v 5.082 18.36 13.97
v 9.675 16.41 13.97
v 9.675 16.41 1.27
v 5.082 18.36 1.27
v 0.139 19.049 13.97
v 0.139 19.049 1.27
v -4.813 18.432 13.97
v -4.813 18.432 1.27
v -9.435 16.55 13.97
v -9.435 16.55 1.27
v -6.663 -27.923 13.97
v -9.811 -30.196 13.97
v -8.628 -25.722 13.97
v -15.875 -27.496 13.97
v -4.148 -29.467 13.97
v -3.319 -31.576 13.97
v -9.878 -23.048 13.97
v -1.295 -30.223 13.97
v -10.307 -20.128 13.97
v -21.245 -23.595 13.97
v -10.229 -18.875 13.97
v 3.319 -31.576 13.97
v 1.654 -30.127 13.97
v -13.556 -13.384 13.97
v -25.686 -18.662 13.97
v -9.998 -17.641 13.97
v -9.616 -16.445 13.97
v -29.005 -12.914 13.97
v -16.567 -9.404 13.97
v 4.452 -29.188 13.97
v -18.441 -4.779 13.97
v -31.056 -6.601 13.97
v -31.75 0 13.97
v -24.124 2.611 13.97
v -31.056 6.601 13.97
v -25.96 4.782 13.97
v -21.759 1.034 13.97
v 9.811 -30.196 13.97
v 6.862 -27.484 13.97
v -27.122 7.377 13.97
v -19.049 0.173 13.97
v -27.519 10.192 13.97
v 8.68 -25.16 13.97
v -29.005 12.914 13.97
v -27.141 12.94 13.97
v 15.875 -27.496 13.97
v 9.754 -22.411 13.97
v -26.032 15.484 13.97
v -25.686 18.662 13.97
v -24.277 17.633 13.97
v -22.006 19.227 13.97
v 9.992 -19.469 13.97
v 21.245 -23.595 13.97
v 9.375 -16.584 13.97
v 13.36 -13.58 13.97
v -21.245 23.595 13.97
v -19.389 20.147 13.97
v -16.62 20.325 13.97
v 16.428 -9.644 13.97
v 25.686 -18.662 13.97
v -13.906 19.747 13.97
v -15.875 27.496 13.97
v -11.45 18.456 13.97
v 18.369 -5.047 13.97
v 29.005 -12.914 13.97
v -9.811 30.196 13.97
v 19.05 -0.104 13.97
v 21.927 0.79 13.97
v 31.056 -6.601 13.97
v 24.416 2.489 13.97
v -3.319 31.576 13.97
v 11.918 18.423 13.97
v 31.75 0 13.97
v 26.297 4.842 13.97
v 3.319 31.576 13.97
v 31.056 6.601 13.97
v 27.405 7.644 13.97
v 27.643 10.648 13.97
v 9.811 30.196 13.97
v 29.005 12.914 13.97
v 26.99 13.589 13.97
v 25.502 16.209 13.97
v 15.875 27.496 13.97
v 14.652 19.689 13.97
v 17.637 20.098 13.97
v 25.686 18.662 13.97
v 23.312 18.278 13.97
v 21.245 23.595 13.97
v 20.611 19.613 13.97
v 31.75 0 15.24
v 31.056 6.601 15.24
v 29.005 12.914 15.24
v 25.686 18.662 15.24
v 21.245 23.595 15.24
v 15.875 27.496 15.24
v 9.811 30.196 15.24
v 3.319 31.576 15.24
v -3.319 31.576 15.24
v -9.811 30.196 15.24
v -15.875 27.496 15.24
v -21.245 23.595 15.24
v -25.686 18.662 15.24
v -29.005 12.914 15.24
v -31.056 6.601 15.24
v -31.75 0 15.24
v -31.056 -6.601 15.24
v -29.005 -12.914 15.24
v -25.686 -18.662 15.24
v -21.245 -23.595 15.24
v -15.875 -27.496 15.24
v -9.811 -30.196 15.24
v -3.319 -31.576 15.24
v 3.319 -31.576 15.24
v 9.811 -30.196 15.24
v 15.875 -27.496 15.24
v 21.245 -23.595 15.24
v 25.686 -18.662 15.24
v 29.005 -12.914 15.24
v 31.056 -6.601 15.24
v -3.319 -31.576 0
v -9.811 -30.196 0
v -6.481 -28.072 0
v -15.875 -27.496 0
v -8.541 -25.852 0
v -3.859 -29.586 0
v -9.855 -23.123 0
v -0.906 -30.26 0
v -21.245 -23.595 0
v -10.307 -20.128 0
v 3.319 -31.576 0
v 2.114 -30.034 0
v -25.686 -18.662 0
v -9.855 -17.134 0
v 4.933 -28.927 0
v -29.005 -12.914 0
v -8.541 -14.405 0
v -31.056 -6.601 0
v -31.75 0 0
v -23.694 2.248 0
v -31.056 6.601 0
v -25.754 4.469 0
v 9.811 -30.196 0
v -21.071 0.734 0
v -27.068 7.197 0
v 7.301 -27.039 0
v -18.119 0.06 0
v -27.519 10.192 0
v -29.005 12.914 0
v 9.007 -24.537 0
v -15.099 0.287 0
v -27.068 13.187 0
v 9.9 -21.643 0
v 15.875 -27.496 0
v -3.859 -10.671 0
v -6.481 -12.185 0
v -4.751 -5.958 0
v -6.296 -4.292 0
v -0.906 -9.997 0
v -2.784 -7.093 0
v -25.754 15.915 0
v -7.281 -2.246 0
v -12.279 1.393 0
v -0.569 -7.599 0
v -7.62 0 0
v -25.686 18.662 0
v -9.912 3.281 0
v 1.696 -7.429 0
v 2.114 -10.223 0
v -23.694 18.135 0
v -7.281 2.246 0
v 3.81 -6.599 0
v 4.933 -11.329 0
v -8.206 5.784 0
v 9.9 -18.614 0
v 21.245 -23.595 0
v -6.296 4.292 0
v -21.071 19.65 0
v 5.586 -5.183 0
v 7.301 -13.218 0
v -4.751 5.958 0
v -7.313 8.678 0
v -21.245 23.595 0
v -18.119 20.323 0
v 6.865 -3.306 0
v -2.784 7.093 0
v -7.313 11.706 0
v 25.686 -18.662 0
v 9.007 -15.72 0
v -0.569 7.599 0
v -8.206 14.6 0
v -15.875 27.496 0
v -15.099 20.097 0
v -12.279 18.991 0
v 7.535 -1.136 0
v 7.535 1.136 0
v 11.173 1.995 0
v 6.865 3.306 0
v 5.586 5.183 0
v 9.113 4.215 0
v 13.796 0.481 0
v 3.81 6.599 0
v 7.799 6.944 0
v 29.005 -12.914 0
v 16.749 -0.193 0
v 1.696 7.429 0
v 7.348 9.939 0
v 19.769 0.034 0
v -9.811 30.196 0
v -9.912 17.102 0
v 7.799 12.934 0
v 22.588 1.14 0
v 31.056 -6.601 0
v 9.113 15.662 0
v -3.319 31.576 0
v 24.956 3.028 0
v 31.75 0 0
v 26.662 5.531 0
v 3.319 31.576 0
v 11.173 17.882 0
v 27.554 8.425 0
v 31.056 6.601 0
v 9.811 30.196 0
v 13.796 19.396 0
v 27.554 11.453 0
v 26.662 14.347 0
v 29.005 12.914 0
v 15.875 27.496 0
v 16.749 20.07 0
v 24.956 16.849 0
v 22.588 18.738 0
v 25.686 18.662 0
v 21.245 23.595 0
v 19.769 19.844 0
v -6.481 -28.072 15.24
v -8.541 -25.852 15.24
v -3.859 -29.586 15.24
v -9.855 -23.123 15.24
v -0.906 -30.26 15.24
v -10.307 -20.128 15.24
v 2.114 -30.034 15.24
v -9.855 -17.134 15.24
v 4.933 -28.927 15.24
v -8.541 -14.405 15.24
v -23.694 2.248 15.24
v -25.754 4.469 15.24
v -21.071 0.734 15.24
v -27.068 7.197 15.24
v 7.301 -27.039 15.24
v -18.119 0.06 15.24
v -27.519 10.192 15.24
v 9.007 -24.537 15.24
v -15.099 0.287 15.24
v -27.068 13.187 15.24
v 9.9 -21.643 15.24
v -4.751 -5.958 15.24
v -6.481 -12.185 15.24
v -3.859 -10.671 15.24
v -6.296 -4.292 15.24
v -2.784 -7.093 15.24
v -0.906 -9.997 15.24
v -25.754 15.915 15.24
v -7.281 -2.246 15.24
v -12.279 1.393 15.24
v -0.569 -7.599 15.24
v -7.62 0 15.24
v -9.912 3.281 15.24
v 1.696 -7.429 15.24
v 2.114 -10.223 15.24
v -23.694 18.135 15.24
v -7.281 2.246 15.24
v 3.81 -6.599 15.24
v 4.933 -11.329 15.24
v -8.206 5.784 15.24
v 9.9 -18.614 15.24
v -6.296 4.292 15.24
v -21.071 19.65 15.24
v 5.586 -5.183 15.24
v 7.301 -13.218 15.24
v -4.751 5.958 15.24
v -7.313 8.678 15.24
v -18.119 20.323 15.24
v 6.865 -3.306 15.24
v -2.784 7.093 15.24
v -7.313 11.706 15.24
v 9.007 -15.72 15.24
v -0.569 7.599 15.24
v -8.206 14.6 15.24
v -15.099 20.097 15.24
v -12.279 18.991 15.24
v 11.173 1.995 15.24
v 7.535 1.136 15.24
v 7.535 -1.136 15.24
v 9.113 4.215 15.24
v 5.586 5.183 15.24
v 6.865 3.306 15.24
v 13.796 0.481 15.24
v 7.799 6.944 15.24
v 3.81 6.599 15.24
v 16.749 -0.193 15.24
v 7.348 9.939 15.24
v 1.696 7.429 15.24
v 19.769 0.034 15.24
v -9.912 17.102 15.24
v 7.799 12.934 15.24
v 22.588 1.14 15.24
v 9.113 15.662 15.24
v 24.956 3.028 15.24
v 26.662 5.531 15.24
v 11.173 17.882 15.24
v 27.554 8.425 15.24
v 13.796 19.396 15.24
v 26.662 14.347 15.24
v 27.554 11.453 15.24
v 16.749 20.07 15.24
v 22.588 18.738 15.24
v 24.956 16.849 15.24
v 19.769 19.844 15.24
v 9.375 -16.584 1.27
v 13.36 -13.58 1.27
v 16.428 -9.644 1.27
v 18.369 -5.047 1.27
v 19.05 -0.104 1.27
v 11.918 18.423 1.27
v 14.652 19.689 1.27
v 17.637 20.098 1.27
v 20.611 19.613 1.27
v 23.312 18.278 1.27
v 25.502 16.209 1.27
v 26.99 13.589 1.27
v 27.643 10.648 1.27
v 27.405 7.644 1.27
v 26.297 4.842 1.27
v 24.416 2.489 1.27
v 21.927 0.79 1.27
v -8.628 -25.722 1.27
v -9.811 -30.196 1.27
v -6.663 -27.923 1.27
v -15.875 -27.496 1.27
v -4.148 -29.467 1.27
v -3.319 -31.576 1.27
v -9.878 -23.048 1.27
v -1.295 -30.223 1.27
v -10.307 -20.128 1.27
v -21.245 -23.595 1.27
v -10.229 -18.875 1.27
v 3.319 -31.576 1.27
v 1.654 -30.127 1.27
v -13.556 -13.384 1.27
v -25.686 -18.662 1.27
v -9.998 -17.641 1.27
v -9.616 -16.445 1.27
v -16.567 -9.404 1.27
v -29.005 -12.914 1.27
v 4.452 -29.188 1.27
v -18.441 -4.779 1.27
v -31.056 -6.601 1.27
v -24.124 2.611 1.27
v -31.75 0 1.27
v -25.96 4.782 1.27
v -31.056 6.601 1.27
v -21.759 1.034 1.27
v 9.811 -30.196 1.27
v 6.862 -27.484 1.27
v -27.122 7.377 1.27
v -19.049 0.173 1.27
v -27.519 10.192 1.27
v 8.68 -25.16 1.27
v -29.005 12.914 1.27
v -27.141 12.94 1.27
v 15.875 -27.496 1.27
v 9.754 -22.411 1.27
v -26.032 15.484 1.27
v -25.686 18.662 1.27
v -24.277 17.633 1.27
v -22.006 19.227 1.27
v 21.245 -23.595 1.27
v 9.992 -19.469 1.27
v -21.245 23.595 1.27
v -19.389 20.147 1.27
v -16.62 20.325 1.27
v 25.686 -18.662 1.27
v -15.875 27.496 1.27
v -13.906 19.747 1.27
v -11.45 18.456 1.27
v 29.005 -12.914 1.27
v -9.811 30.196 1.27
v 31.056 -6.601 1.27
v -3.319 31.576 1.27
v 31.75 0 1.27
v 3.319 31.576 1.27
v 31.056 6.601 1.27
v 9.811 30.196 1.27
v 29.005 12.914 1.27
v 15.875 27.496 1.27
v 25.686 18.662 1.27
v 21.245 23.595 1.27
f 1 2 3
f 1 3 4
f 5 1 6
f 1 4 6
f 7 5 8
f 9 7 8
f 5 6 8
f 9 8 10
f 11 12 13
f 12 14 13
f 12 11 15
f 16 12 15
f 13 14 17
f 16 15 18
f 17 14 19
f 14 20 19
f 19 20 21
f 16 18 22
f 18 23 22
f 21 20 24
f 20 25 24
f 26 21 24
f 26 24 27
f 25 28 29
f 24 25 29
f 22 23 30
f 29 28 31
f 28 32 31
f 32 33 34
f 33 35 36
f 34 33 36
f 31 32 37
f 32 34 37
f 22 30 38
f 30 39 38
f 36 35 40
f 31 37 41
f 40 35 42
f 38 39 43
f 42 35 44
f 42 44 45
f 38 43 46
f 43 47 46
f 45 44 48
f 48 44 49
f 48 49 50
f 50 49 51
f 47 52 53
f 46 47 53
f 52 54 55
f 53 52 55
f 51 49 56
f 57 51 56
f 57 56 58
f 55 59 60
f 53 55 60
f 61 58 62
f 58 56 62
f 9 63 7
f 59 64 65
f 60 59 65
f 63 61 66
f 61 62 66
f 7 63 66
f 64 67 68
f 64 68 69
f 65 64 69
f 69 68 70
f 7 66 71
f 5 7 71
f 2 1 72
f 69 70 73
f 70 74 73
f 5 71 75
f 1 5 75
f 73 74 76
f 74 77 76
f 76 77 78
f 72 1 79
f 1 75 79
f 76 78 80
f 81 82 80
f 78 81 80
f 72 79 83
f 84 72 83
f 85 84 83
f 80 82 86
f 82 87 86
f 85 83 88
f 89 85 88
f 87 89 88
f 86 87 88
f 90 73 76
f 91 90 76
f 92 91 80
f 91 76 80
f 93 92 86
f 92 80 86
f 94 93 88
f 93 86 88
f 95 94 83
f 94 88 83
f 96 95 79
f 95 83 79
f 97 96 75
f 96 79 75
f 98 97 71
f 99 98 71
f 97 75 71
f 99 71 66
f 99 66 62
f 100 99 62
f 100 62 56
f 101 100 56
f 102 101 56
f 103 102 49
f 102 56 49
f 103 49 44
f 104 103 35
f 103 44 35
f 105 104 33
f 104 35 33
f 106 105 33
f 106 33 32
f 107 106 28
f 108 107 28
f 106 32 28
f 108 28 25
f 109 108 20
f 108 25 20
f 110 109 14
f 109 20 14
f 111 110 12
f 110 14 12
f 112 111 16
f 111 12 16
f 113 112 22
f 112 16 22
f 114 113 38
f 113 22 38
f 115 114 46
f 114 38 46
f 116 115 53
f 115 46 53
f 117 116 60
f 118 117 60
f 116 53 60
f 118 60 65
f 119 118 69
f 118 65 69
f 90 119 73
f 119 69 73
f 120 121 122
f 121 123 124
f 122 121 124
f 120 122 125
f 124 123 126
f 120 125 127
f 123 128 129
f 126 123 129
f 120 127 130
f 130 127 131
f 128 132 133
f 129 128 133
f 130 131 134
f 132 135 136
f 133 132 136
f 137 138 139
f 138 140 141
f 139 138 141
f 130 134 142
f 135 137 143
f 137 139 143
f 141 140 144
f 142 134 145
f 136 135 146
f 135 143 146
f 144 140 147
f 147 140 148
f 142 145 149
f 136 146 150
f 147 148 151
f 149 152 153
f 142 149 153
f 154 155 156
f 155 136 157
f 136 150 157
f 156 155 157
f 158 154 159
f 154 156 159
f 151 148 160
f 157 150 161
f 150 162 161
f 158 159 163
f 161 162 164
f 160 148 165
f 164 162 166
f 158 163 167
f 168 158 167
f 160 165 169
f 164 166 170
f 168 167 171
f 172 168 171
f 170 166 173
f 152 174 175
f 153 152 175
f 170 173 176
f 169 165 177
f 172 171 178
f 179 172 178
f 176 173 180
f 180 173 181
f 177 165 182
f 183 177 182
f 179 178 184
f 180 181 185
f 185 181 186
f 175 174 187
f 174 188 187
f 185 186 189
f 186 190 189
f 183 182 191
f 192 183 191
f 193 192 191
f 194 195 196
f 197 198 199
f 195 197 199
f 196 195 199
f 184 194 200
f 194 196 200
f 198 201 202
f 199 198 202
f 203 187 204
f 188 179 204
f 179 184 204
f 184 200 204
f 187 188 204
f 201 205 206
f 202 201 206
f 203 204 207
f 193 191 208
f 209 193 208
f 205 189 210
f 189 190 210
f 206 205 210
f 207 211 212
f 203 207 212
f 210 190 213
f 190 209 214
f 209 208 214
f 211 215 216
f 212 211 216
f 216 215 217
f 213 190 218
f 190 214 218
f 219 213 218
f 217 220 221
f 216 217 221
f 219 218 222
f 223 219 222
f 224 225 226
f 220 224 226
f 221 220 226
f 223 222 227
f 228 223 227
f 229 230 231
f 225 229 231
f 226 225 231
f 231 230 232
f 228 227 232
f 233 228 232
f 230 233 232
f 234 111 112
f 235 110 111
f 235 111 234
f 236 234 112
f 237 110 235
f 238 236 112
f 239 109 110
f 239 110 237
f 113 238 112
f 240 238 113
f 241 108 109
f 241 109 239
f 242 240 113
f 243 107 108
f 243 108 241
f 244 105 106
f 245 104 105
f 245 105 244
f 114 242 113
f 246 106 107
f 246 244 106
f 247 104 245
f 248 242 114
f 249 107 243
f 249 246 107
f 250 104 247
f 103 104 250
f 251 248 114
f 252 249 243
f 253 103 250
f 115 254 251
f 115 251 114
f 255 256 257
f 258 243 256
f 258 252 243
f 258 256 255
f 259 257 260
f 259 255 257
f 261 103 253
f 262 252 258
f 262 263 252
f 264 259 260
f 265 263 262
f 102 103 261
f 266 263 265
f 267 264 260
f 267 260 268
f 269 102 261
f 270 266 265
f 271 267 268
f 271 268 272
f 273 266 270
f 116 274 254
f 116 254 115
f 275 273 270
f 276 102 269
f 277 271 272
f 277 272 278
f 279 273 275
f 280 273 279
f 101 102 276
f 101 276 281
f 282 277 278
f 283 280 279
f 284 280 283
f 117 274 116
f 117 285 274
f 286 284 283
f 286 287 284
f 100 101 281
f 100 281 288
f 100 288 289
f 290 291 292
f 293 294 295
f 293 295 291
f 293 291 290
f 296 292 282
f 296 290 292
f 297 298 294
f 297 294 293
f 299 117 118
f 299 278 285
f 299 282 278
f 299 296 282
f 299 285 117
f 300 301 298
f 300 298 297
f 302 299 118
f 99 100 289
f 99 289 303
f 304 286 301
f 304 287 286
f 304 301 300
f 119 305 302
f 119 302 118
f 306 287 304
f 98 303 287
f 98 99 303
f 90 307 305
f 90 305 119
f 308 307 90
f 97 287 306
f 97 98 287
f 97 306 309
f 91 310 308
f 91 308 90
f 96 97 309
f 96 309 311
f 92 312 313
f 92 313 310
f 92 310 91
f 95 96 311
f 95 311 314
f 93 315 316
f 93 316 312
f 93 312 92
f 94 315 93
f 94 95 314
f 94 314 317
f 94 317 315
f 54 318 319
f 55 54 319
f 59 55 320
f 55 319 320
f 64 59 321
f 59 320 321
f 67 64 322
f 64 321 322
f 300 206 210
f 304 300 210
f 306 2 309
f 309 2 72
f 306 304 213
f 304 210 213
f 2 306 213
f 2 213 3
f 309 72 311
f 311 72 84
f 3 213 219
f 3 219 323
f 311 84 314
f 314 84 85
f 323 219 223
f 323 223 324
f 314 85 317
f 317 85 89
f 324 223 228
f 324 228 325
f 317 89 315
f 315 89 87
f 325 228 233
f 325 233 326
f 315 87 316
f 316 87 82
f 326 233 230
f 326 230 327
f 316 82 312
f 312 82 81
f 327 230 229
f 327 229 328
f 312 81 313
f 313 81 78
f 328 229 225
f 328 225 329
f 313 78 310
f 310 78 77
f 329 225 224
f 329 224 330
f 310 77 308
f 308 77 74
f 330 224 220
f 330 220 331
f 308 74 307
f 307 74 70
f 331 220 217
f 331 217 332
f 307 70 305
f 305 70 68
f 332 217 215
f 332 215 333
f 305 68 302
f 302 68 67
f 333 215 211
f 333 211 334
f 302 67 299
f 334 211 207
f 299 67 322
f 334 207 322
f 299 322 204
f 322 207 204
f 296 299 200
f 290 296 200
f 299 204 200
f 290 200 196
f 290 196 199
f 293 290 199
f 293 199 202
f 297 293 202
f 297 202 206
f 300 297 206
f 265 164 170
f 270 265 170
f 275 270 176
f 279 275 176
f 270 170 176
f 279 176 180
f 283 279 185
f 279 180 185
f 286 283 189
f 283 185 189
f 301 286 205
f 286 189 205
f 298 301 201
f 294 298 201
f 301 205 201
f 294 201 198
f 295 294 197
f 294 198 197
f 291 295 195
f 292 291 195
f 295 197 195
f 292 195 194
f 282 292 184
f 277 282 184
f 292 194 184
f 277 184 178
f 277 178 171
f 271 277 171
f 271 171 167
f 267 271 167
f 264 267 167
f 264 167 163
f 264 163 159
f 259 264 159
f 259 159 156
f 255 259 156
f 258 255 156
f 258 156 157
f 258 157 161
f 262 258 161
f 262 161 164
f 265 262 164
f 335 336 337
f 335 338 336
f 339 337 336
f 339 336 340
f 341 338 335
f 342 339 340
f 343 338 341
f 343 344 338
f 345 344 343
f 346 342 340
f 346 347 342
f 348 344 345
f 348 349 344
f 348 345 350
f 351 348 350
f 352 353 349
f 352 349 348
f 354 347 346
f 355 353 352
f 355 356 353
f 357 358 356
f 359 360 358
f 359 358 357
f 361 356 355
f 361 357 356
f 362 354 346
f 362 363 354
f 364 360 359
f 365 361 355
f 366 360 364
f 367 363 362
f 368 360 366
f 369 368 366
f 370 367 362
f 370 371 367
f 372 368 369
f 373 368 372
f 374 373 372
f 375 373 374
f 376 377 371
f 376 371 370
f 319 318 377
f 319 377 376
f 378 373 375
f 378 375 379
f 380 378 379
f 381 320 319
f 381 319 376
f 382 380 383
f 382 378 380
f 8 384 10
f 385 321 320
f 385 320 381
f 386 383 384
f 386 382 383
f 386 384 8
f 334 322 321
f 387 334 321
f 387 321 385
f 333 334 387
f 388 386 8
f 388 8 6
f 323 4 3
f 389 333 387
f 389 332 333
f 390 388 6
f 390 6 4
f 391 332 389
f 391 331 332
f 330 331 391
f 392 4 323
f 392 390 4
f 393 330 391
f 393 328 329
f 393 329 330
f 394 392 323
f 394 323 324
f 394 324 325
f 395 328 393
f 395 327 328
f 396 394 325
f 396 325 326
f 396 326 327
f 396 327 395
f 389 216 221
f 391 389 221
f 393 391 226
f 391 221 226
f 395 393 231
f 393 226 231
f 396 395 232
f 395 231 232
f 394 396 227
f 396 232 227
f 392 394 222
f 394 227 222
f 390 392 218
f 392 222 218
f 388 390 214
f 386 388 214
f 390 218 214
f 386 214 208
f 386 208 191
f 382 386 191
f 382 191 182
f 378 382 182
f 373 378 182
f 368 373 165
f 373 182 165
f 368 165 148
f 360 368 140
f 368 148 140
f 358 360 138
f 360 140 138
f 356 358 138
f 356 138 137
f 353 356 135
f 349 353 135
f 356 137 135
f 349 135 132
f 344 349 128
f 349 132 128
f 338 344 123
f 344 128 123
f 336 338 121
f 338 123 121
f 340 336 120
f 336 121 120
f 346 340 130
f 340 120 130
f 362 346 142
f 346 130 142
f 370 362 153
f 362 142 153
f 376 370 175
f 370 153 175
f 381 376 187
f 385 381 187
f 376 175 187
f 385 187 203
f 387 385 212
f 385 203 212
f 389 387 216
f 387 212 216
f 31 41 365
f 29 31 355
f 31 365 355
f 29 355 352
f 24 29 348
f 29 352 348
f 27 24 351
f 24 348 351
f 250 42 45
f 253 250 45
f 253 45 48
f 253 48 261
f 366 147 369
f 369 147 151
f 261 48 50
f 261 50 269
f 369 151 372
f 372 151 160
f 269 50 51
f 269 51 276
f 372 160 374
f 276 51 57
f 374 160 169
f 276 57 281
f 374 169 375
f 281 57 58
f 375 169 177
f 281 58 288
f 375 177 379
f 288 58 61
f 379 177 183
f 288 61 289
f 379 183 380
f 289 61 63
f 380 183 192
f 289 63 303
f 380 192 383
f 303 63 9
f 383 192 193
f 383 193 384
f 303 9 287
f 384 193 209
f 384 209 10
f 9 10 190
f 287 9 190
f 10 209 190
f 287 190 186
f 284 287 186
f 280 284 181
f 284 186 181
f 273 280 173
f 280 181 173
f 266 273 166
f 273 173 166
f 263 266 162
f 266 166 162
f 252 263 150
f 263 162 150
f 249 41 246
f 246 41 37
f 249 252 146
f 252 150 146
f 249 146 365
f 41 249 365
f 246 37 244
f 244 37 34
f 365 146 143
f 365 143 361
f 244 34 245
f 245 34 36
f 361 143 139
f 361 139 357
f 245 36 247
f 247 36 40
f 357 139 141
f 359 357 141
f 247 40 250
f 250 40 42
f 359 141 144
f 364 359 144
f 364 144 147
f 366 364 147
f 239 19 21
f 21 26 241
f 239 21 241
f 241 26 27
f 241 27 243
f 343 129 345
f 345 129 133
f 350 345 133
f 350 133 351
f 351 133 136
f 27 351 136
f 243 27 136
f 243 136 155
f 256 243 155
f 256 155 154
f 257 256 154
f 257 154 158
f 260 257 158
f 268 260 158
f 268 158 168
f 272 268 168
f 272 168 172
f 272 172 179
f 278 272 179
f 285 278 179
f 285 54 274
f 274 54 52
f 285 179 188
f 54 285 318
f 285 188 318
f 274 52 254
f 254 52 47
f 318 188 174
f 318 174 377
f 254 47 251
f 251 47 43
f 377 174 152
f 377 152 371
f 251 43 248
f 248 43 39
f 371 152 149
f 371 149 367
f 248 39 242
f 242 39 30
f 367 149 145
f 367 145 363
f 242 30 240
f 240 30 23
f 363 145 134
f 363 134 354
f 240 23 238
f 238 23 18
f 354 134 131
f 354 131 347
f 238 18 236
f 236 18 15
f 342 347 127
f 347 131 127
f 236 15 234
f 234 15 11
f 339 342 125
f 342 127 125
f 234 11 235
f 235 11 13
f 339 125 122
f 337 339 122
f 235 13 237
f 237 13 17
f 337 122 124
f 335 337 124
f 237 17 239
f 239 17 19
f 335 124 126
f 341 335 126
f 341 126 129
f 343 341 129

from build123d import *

# Parameters (mm, degrees)
F0_R     = 31.75
F1_DEPTH = 1.27
F2_R     = 19.05
F3_DEPTH = 12.7
F4_R     = 31.75
F5_DEPTH = 1.27
F7_D     = 20.32
F8_D     = 20.32
F9_D     = 20.32
F11_D    = 15.24


with BuildPart() as f1:
    # F0 (on Top) → F1 (new body)
    with BuildSketch(Plane.XY):
        Circle(F0_R)
    extrude(amount=F1_DEPTH)

    # F2 (on face) → F3 (join)
    with BuildSketch(Plane.XY.offset(1.27)):
        Circle(F2_R)
    extrude(amount=F3_DEPTH)

    # F4 (on face) → F5 (join)
    with BuildSketch(Plane.XY.offset(13.97)):
        Circle(F4_R)
    extrude(amount=F5_DEPTH)

    # F7 (through all)
    with Locations(Plane.XY.offset(15.24)):
        with Locations((17.50788, 9.938807)):
            Hole(F7_D / 2)

    # F8 (through all)
    with Locations(Plane.XY.offset(15.24)):
        with Locations((-0.146656, -20.12828)):
            Hole(F8_D / 2)

    # F9 (through all)
    with Locations(Plane.XY.offset(15.24)):
        with Locations((-17.359468, 10.191849)):
            Hole(F9_D / 2)

    # F11 (through all)
    with Locations(Plane.XY.offset(15.24)):
        with Locations((0, 0)):
            Hole(F11_D / 2)


solid = f1.part
